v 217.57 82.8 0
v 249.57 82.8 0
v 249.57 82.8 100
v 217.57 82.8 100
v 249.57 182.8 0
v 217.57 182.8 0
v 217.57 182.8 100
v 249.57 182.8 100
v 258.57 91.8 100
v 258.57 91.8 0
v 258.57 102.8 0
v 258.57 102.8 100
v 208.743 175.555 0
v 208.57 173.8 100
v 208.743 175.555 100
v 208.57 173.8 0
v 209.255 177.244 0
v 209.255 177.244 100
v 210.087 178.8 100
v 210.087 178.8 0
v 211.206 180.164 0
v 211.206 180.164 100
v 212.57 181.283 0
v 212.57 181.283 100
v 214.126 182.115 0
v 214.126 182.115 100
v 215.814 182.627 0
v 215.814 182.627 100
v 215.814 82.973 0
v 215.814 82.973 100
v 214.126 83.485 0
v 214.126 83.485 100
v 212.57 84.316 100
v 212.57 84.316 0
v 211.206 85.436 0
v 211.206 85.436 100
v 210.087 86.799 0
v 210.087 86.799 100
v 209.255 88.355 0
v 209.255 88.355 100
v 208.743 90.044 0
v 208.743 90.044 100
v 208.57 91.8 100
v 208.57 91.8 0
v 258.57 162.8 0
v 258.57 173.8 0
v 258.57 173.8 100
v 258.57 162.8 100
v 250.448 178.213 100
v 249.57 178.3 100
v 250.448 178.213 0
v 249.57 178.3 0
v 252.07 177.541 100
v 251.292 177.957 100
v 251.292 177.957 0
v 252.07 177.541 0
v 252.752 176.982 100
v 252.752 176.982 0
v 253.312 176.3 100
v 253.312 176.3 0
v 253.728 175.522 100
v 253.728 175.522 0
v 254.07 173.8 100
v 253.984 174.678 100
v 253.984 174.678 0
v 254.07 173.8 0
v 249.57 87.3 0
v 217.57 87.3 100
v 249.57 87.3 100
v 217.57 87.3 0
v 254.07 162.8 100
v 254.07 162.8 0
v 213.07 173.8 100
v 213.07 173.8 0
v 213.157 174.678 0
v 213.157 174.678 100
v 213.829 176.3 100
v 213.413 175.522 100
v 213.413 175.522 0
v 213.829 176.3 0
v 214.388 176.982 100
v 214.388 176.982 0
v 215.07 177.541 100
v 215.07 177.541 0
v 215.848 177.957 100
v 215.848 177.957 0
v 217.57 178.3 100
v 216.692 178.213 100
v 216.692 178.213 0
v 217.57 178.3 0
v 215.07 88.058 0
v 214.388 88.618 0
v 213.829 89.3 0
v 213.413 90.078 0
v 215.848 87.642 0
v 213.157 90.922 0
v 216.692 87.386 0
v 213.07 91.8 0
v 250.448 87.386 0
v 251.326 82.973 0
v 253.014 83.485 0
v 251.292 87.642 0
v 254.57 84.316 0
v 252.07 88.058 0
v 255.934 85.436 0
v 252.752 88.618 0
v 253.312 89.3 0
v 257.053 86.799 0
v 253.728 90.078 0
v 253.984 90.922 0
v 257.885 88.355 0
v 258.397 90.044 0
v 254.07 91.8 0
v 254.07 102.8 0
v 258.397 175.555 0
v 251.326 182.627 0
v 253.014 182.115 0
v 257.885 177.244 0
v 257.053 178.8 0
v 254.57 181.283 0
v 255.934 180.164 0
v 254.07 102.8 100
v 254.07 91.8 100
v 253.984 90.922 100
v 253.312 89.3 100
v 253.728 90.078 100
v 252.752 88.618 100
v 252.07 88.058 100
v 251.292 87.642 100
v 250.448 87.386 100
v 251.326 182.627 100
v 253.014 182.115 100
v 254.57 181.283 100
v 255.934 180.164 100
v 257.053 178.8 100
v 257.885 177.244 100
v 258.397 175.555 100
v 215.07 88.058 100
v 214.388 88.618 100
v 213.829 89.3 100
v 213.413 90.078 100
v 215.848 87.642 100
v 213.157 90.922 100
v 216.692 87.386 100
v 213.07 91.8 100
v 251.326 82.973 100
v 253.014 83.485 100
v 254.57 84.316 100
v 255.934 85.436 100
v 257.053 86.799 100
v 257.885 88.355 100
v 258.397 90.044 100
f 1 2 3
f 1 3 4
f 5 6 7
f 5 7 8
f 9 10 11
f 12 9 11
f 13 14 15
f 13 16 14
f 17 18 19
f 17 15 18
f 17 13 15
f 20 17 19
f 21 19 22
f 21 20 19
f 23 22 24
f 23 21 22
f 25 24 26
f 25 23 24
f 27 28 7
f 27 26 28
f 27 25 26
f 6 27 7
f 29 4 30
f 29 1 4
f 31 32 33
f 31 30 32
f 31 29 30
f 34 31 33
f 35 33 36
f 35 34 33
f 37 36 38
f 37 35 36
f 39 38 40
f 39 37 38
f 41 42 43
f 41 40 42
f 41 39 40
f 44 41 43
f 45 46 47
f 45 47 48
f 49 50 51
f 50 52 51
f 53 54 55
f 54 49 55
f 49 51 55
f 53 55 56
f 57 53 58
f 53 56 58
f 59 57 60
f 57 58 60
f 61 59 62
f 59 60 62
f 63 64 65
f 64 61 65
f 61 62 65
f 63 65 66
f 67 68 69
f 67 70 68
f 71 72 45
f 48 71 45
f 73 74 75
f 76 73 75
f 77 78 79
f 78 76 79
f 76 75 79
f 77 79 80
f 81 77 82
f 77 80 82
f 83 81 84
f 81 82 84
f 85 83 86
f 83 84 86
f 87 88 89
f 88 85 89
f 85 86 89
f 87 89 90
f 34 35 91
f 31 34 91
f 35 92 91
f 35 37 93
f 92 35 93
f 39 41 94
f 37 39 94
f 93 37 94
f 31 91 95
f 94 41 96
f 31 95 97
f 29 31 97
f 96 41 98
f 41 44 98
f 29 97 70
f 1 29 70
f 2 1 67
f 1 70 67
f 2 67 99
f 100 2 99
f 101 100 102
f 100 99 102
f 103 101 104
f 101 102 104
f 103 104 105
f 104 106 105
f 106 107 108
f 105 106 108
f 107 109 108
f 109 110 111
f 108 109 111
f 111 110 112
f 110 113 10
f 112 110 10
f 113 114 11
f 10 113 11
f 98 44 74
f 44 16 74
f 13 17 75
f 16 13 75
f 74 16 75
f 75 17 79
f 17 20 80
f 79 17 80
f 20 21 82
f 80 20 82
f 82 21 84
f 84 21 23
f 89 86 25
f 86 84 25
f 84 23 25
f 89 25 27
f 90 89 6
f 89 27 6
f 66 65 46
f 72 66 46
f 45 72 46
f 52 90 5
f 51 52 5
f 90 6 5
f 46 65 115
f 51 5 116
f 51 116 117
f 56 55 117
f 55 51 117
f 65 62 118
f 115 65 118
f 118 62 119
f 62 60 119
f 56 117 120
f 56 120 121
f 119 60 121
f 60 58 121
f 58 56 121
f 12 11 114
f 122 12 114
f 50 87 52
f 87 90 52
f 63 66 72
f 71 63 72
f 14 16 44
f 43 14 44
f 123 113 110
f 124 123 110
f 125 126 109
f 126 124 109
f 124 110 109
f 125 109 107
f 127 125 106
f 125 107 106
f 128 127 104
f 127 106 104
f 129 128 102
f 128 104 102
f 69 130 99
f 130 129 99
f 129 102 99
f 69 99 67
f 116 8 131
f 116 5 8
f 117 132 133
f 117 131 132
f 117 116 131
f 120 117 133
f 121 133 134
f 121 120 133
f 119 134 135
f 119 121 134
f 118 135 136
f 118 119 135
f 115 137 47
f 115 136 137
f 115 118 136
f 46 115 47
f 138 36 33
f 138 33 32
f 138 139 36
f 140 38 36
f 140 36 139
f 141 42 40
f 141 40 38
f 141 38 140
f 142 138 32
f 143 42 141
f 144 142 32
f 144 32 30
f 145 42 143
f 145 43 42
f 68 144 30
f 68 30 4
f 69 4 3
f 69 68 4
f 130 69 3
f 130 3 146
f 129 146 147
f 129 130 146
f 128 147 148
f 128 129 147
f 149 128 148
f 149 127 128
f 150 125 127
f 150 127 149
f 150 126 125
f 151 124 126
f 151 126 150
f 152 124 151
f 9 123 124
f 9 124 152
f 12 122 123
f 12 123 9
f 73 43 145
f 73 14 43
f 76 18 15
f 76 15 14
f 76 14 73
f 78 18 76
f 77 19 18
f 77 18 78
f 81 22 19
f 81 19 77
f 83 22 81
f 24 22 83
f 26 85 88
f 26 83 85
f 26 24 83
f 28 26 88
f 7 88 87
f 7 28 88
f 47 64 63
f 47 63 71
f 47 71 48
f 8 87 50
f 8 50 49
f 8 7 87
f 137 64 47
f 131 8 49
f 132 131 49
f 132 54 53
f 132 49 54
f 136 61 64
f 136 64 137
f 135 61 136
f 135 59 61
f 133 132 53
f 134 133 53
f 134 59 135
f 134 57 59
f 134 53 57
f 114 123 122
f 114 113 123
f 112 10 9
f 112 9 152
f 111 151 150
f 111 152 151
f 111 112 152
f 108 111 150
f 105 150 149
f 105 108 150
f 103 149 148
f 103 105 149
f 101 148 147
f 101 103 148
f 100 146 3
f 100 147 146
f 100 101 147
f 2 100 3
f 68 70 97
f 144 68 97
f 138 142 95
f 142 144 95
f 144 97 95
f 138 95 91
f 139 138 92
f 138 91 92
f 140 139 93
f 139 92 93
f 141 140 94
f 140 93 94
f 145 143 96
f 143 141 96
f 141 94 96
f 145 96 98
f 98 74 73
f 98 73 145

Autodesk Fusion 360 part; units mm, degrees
sketch "スケッチ1" plane through (0, 0, 0) normal (0, 0, 1) x (1, 0, 0)
  line L0 (213.0702, 173.7996) -> (213.0702, 91.7996)
  line L1 (208.5702, 173.7996) -> (208.5702, 91.7996)
  arc A0 (249.5702, 82.7996) -> (258.5702, 91.7996) centre (249.5702, 91.7996) ccw
  arc A1 (249.5702, 87.2996) -> (254.0702, 91.7996) centre (249.5702, 91.7996) ccw
  line L2 (249.5702, 82.7996) -> (217.5702, 82.7996)
  line L3 (217.5702, 87.2996) -> (249.5702, 87.2996)
  arc A2 (208.5702, 91.7996) -> (217.5702, 82.7996) centre (217.5702, 91.7996) ccw
  arc A3 (213.0702, 91.7996) -> (217.5702, 87.2996) centre (217.5702, 91.7996) ccw
  line L4 (254.0702, 91.7996) -> (254.0702, 102.7996)
  line L5 (258.5702, 91.7996) -> (258.5702, 102.7996)
  line L6 (258.5702, 102.7996) -> (254.0702, 102.7996)
  arc A4 (258.5702, 173.7996) -> (249.5702, 182.7996) centre (249.5702, 173.7996) ccw
  arc A5 (254.0702, 173.7996) -> (249.5702, 178.2996) centre (249.5702, 173.7996) ccw
  arc A6 (217.5702, 182.7996) -> (208.5702, 173.7996) centre (217.5702, 173.7996) ccw
  arc A7 (217.5702, 178.2996) -> (213.0702, 173.7996) centre (217.5702, 173.7996) ccw
  line L7 (217.5702, 178.2996) -> (249.5702, 178.2996)
  line L8 (217.5702, 182.7996) -> (249.5702, 182.7996)
  line L9 (258.5702, 173.7996) -> (258.5702, 162.7996)
  line L10 (254.0702, 173.7996) -> (254.0702, 162.7996)
  line L11 (254.0702, 162.7996) -> (258.5702, 162.7996)
  point P0 (208.5702, 182.7996)
extrude "押し出し1" add sketch "スケッチ1" along normal blind 100
